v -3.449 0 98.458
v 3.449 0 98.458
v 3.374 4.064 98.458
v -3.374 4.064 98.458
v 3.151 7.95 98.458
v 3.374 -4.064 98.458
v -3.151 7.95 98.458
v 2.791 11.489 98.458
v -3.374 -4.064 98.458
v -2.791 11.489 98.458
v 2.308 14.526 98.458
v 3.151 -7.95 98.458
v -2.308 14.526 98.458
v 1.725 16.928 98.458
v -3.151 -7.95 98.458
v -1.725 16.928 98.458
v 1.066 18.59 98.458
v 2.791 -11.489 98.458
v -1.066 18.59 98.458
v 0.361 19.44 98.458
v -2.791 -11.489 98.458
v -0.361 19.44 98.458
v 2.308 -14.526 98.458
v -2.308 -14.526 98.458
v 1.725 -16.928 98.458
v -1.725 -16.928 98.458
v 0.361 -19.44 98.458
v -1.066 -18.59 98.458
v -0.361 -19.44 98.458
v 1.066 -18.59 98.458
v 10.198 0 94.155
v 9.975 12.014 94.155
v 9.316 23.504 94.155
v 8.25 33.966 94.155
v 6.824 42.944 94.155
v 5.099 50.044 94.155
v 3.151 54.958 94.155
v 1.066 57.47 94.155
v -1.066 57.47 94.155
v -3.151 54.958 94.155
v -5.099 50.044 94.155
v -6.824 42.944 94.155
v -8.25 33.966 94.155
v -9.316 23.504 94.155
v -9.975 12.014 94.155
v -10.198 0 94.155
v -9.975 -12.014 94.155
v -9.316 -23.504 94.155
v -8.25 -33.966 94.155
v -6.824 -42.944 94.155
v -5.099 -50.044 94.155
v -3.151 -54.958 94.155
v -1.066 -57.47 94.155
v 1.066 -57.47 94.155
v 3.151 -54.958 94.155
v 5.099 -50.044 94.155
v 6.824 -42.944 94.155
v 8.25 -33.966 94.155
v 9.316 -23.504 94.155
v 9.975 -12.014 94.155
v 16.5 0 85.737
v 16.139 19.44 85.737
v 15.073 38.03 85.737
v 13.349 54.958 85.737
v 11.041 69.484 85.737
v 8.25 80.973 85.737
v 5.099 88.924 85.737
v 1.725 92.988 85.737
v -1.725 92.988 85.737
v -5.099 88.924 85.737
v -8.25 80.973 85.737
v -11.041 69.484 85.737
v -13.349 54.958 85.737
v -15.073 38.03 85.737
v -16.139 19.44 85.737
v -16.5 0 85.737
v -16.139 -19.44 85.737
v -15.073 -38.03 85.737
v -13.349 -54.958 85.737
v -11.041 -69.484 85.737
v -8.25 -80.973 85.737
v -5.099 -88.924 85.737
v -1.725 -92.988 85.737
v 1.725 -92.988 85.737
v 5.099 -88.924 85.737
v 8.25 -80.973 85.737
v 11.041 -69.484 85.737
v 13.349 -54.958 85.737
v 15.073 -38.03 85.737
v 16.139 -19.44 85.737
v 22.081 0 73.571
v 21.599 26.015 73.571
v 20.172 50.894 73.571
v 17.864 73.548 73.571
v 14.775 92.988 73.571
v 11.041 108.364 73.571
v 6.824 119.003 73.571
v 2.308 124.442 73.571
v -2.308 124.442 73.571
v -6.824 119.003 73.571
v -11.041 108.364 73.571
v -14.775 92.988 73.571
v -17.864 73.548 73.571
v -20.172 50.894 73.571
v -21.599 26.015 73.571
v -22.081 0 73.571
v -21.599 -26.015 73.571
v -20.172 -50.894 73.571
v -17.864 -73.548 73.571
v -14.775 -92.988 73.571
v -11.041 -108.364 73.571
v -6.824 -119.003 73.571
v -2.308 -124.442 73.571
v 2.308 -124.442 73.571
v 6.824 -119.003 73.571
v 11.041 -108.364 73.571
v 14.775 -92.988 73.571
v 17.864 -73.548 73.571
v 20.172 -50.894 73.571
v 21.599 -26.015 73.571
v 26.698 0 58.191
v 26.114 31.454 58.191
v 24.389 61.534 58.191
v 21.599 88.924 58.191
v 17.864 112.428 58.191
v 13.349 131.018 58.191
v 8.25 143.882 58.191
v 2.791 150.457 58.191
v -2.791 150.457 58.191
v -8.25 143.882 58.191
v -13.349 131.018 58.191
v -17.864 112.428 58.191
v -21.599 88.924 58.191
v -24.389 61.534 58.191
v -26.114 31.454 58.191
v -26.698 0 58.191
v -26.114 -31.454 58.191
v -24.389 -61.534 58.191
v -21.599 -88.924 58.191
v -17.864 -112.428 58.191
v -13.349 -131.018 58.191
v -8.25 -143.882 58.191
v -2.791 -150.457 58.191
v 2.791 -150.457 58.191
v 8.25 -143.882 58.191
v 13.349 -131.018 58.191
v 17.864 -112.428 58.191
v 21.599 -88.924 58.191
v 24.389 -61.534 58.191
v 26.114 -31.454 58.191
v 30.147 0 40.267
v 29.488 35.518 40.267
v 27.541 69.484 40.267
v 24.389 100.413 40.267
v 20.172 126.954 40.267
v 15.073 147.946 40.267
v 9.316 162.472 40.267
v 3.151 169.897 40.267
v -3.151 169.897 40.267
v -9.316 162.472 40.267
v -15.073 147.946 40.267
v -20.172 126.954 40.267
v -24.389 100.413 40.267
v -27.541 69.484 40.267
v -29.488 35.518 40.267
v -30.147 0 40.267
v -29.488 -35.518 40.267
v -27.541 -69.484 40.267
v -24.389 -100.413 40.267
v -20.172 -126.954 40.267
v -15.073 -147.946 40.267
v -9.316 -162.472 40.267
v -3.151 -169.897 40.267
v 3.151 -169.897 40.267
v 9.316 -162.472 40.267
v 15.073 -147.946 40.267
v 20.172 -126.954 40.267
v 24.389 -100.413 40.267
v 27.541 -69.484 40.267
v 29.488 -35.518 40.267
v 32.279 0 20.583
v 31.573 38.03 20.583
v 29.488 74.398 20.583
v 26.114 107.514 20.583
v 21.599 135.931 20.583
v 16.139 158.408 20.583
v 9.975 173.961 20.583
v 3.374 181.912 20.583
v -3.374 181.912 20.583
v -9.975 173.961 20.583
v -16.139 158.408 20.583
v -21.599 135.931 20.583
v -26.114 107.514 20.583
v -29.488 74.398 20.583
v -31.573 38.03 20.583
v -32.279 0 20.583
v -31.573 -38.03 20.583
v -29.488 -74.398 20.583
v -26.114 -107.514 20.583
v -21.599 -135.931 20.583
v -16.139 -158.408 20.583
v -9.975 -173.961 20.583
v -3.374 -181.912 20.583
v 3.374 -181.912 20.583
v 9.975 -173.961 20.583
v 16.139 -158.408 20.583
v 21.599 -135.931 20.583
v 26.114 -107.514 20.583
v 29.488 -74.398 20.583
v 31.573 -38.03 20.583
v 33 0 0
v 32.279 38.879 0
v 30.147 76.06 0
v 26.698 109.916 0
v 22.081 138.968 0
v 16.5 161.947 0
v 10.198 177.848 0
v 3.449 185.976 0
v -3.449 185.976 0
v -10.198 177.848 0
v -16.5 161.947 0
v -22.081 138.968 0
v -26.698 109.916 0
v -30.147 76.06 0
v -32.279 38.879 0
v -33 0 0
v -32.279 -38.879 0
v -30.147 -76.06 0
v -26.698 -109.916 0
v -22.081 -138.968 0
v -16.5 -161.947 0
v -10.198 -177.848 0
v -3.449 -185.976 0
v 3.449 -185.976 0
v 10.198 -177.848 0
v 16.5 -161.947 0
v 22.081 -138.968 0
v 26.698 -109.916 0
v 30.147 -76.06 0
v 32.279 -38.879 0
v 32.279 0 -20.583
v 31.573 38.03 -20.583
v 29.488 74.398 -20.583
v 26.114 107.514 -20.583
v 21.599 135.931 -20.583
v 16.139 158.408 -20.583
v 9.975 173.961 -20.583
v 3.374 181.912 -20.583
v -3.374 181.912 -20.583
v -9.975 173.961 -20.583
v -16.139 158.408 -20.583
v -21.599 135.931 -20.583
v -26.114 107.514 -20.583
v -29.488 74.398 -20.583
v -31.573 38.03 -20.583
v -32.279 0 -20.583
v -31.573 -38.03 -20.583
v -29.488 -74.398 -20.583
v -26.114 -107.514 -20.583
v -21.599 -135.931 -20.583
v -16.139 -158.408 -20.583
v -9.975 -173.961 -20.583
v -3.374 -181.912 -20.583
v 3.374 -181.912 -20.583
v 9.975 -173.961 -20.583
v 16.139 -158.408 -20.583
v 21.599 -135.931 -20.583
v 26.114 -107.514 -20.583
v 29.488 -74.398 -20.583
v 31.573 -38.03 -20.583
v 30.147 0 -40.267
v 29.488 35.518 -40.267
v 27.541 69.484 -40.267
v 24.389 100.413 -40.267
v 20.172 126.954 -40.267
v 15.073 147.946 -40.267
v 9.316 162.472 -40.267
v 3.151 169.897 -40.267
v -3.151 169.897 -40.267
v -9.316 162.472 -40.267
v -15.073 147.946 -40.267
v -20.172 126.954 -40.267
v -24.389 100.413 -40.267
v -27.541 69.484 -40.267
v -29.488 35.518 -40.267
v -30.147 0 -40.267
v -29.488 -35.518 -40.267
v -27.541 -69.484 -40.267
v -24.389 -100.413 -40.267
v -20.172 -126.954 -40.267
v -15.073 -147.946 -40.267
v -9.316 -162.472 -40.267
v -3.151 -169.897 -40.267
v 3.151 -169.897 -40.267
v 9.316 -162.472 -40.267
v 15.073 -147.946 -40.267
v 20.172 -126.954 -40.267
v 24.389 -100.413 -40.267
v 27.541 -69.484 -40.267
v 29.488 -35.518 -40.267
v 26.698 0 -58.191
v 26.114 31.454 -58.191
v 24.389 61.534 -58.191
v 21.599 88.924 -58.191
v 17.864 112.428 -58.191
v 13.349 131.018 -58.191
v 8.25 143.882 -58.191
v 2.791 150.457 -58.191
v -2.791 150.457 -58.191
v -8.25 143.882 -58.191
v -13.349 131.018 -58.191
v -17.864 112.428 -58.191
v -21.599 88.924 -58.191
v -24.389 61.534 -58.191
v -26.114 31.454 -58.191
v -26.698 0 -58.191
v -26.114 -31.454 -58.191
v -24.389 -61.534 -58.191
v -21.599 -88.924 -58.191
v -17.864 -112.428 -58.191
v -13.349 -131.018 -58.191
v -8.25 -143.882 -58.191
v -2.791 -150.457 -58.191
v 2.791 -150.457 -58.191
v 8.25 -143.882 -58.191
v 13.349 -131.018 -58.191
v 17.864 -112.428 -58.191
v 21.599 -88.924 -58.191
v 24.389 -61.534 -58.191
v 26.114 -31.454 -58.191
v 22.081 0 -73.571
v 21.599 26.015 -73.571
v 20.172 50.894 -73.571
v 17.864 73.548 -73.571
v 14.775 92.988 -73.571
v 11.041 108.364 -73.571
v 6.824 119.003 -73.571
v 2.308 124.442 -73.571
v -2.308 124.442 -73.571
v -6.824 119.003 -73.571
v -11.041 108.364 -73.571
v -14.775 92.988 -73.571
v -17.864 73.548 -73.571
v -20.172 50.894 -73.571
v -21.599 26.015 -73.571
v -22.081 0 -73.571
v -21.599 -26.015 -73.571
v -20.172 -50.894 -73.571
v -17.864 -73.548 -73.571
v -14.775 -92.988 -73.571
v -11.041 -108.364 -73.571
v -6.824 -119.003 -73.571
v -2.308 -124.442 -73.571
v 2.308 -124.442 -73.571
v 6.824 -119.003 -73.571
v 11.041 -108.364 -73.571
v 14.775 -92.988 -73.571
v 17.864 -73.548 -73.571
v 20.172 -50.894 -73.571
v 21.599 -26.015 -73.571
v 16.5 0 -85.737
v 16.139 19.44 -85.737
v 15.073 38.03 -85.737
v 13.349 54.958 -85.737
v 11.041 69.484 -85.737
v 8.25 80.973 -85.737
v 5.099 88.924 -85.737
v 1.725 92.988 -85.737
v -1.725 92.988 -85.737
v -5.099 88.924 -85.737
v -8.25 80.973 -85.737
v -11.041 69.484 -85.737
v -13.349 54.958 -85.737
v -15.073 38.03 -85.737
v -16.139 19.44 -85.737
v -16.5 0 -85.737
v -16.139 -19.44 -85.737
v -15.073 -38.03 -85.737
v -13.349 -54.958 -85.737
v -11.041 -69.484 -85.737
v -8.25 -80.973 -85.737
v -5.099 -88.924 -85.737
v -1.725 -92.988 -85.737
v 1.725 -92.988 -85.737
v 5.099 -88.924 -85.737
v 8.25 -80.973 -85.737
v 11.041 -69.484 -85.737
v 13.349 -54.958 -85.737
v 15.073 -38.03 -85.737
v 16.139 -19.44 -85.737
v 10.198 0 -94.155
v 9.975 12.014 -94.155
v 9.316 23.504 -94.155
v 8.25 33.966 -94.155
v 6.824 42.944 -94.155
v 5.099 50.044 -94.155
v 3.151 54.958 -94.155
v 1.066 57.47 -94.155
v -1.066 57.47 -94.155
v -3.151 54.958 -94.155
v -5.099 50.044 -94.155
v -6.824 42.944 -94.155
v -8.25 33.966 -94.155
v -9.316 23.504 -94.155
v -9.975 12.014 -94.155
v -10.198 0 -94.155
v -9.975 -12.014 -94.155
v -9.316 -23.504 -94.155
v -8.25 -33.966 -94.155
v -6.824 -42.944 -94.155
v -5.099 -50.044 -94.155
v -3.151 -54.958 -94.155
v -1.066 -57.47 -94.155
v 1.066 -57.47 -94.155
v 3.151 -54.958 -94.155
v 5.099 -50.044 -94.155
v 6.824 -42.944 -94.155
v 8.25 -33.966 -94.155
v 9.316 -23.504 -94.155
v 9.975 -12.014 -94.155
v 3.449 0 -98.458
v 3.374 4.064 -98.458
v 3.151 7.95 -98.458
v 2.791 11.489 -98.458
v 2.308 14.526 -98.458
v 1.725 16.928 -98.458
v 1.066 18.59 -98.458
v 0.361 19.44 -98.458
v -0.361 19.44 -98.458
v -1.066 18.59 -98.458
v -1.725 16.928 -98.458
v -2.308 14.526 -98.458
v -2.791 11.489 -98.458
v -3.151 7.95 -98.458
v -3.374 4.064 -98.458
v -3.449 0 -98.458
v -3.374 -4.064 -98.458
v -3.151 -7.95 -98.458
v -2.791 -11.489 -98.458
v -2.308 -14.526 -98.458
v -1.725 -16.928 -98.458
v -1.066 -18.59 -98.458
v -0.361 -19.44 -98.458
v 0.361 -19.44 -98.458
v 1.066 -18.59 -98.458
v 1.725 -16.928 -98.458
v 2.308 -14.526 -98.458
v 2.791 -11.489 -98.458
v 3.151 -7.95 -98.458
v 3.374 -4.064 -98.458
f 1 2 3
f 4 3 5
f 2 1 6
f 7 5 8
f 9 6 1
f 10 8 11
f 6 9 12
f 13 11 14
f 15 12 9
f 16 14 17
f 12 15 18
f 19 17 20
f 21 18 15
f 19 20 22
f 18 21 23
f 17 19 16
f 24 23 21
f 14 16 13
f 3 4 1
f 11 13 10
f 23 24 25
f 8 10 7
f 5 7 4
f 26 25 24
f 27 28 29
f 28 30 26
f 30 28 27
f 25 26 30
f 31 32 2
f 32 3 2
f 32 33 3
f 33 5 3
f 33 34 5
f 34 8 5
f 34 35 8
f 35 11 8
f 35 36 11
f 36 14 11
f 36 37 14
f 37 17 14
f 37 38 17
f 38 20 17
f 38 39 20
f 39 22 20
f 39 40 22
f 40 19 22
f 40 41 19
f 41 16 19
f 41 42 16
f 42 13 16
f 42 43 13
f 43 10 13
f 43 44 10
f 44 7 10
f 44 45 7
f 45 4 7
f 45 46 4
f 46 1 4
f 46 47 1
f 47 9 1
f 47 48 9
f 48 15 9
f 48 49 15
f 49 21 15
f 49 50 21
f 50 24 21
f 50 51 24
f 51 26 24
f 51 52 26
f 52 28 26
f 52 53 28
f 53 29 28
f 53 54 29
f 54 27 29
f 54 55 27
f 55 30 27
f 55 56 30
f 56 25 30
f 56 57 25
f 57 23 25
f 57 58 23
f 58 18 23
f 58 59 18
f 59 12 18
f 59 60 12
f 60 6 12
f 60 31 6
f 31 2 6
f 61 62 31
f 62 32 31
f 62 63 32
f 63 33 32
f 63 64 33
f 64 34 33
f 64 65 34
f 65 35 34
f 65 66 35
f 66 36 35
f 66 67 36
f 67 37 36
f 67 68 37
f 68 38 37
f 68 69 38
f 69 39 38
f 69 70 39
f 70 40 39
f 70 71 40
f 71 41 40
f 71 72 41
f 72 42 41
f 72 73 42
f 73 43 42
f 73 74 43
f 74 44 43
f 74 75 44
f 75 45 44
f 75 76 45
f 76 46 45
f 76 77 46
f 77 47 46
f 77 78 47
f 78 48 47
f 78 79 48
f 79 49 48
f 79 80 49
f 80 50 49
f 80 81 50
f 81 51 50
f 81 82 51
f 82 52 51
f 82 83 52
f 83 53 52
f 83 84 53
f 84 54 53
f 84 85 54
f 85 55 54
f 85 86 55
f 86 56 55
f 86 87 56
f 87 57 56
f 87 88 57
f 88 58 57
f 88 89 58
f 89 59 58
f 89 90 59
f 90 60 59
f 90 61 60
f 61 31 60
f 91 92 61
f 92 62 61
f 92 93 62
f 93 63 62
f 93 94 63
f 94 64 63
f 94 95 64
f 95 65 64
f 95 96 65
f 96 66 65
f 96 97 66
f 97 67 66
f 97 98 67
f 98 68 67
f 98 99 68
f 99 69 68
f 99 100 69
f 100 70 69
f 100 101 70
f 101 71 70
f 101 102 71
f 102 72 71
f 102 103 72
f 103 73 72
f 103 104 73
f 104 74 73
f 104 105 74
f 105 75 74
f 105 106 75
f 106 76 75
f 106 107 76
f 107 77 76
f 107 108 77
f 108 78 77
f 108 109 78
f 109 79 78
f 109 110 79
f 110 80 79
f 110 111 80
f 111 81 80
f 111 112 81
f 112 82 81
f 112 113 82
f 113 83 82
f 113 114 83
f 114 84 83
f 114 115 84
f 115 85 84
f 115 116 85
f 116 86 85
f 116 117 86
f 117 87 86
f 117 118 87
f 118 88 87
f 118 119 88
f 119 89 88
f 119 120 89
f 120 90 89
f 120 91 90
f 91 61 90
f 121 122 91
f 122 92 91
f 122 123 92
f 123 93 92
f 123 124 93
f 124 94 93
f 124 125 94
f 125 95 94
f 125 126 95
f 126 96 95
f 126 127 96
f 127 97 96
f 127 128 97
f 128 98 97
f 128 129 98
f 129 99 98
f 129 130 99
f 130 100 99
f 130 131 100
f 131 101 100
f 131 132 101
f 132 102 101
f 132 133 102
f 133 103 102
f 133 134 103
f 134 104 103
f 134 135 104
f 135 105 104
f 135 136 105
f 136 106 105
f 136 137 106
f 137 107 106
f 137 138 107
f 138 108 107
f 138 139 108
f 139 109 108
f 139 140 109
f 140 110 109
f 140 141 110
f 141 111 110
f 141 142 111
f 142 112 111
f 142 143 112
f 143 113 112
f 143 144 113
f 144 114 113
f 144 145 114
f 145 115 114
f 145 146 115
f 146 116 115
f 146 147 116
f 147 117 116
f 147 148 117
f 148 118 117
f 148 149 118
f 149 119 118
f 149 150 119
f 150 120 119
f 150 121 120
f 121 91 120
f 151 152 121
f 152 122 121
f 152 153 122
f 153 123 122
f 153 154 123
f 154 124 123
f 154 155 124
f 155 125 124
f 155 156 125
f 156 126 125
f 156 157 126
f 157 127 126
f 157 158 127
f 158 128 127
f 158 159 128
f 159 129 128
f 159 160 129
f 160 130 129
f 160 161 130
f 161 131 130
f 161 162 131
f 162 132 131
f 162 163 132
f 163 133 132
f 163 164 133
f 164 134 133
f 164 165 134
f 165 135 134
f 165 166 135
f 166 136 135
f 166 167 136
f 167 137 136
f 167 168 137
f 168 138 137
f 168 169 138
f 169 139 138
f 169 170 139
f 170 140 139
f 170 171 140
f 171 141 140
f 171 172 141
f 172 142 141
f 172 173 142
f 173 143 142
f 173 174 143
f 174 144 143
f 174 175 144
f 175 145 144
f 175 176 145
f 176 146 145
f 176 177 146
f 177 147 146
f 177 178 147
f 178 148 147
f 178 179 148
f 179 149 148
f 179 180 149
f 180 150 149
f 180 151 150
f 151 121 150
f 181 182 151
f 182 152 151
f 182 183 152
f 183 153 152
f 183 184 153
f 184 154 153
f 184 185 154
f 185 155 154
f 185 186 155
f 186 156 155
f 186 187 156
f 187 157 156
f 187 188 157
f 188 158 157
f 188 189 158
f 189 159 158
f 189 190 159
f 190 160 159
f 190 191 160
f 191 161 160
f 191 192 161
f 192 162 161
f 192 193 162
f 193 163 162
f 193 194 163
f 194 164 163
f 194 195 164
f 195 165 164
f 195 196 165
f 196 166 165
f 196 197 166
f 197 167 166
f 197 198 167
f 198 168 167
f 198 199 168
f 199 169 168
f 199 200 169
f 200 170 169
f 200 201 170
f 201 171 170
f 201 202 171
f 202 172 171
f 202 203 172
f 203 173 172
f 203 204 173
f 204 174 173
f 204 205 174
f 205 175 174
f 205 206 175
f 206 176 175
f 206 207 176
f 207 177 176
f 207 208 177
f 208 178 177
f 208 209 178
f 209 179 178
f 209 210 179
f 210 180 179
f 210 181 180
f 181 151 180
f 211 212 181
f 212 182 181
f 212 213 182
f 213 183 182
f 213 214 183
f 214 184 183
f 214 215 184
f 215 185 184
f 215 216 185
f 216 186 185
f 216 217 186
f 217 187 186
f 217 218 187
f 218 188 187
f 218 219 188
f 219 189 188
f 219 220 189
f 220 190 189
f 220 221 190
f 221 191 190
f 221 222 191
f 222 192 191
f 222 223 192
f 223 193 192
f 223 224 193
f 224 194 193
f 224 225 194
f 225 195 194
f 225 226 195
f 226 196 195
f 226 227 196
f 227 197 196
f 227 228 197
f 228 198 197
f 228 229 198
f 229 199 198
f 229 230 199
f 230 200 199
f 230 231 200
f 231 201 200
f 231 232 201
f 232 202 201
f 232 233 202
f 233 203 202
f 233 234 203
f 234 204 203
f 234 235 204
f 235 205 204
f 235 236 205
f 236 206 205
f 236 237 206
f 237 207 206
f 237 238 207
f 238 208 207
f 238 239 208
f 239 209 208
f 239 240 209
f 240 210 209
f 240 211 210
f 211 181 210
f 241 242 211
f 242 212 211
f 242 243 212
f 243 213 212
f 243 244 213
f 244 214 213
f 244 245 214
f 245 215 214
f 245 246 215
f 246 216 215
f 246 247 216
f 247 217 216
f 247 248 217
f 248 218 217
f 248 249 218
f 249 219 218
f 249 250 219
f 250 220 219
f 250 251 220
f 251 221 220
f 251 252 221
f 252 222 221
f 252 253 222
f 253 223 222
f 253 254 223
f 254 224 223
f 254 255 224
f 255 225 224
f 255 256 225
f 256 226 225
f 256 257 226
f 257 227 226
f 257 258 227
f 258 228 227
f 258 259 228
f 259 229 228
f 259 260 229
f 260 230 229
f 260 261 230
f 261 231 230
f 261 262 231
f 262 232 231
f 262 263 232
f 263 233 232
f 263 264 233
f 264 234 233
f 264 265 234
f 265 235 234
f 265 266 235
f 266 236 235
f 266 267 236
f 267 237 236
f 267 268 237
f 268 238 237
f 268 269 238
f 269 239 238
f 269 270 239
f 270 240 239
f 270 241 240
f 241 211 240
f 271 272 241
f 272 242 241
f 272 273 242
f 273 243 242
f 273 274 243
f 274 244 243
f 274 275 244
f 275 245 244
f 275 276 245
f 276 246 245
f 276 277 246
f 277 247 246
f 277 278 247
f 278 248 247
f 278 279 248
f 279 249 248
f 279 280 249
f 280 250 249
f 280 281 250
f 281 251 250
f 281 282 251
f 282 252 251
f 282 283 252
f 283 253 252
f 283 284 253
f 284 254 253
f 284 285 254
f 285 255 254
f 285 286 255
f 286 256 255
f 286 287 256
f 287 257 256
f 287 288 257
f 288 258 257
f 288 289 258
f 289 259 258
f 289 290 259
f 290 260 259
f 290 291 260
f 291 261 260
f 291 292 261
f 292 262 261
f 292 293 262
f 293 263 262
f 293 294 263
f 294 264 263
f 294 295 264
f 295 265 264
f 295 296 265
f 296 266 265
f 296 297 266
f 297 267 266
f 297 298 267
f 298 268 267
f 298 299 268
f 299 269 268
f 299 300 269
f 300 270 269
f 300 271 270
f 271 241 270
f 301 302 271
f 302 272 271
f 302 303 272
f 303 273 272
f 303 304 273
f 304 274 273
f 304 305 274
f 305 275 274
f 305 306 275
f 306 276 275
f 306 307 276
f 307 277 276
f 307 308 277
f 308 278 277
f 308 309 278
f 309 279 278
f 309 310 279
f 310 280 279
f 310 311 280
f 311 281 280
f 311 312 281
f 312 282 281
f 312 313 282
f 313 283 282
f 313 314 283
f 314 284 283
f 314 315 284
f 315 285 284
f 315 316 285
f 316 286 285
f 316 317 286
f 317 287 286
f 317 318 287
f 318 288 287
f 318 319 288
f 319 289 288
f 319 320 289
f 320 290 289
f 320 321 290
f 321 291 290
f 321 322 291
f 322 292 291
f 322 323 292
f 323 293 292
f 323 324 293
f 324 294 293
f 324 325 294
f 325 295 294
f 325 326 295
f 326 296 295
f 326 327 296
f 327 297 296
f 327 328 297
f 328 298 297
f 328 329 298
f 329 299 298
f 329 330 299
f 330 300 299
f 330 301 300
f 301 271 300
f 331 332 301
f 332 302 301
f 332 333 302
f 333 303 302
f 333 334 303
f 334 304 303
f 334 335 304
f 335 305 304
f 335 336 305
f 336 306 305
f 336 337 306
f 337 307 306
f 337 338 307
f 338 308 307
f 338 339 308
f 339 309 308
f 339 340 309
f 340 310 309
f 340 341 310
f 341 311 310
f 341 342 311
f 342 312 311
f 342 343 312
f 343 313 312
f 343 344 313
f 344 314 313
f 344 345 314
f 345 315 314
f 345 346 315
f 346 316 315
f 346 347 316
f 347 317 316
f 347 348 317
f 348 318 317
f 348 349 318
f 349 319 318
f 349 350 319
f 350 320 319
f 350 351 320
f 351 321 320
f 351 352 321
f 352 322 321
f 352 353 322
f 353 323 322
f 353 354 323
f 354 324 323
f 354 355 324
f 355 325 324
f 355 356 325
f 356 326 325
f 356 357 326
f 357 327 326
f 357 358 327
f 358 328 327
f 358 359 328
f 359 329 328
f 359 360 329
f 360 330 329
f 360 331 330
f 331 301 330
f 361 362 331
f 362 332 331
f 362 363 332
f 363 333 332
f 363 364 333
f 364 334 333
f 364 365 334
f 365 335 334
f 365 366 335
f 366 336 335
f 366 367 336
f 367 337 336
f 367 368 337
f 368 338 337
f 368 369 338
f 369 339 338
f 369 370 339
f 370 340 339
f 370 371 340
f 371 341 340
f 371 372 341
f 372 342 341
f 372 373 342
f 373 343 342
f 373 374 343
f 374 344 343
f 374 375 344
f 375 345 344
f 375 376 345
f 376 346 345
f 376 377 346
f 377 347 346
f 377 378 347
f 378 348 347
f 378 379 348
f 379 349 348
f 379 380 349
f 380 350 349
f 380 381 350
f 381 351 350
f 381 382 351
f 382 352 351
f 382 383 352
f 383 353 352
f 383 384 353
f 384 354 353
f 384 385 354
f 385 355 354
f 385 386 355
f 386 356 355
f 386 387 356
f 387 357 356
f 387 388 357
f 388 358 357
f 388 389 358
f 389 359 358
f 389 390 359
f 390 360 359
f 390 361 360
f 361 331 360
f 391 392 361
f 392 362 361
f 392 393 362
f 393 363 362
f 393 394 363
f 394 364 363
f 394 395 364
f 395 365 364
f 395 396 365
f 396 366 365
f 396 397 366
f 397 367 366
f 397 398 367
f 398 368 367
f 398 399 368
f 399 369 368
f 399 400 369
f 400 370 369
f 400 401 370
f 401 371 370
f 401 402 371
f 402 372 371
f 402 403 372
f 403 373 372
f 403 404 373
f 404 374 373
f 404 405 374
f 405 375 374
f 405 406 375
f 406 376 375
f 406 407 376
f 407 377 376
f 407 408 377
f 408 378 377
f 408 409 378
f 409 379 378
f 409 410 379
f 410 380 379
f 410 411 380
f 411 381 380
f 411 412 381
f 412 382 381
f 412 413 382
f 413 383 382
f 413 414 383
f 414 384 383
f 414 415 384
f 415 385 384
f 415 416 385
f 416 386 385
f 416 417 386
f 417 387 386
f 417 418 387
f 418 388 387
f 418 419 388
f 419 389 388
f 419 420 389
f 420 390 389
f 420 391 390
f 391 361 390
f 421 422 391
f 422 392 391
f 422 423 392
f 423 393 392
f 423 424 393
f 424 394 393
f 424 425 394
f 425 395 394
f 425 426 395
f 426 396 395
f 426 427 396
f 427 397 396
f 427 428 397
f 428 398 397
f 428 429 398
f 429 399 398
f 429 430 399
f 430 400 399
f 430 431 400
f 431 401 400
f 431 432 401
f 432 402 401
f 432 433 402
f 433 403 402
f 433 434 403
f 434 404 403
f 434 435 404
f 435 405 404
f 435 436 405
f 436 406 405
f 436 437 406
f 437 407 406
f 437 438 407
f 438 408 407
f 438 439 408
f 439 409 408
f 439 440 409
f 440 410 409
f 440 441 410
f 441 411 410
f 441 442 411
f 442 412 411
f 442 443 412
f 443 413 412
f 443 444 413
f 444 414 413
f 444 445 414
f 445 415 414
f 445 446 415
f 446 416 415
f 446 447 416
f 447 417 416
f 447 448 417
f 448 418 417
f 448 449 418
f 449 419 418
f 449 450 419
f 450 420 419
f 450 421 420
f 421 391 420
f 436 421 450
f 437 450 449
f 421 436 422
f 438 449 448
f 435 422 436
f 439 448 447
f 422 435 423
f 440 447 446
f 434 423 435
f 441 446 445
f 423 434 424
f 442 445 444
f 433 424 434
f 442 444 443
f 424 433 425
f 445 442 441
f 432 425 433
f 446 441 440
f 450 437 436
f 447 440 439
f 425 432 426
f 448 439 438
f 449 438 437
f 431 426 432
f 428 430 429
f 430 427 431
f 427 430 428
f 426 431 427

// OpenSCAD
// Generated by SolidPython 1.0.1 on 2020-07-29 00:46:46


scale(v = [3, 17, 9]) {
	sphere(r = 11);
}
/***********************************************
*********      SolidPython code:      **********
************************************************
 
# import packages: SolidPython
from solid import *
from solid.utils import *
from itertools import chain, combinations, permutations


class Resize:

    def __init__(self, scad_file):
        self.scad_file = scad_file
        #self.scad_file = import_scad(scad_file)
        # cone/cylinder param:
        self.r1 = 0
        self.r2 = 0
        self.h = 0
        # rectangular prism param:
        self.w = 0
        self.l = 0
        # ellipse param:
        self.r = 0

    # import OpenScad code (file name corresponds to shape)


    # classify shape + parameters
    def assign(self, param1, param2, param3):
        if self.scad_file == 'cone.scad':
            self.r1 = param1
            self.r2 = param2
            self.h = param3
        elif self.scad_file == 'cylinder.scad':
            self.r1 = param1
            self.r2 = param2
            self.h = param3
        elif self.scad_file == 'rectangularPrism.scad':
            self.h = param1
            self.l = param2
            self.w = param3
        else:
            self.r = param1
            self.h = param2

    # resize parameters
    def iterate(self):
        x = range(3, 20, 2)
        i = 1
        if self.scad_file == 'cone.scad':
            tempList = list(permutations(x, 2))
            for temp in tempList:
                param1 = temp[0]
                param2 = temp[1]
                filepath = 'produced_scad_files/' + 'cone' + str(param1) + '_' + str(param2) + '_' + '.scad'
                scad_render_to_file(cylinder(h=param1, r1=param2, r2=0), filepath)

        elif self.scad_file == 'cylinder.scad':
            tempList = list(permutations(x, 3))
            for temp in tempList:
                param1 = temp[0]
                param2 = temp[1]
                filepath = 'produced_scad_files/' + 'cylinder' + str(param1) + '_' + str(param2) + '_' + '.scad'
                scad_render_to_file(cylinder(h=param1, r1=param2, r2=param2), filepath)

        elif self.scad_file == 'rectangularPrism.scad':
            tempList = list(permutations(x, 3))
            for temp in tempList:
                param1 = temp[0]
                param2 = temp[1]
                param3 = temp[2]
                filepath = 'produced_scad_files/' + 'rectangularPrism' + str(param1) + '_' + str(param2) + '_' + str(
                    param3) + '.scad'
                scad_render_to_file(cube(size=(param1, param2, param3)), filepath)

        elif self.scad_file == 'ellipse.scad':
            tempList = list(permutations(x, 4))
            for temp in tempList:
                param1 = temp[0]
                param2 = temp[1]
                param3 = temp[2]
                param4 = temp[3]
                filepath = 'produced_scad_files/' + 'ellipse' + str(param1) + '_' + str(param2) + '_' + str(param3) + '_' + str(param4) + '.scad'
                scad_render_to_file(scale([param1, param2, param3])(sphere(r=param4)), filepath)

    def render_to_scadfile(self):
        scad_render_to_file(scad, 'example.scad') 
 
************************************************/
